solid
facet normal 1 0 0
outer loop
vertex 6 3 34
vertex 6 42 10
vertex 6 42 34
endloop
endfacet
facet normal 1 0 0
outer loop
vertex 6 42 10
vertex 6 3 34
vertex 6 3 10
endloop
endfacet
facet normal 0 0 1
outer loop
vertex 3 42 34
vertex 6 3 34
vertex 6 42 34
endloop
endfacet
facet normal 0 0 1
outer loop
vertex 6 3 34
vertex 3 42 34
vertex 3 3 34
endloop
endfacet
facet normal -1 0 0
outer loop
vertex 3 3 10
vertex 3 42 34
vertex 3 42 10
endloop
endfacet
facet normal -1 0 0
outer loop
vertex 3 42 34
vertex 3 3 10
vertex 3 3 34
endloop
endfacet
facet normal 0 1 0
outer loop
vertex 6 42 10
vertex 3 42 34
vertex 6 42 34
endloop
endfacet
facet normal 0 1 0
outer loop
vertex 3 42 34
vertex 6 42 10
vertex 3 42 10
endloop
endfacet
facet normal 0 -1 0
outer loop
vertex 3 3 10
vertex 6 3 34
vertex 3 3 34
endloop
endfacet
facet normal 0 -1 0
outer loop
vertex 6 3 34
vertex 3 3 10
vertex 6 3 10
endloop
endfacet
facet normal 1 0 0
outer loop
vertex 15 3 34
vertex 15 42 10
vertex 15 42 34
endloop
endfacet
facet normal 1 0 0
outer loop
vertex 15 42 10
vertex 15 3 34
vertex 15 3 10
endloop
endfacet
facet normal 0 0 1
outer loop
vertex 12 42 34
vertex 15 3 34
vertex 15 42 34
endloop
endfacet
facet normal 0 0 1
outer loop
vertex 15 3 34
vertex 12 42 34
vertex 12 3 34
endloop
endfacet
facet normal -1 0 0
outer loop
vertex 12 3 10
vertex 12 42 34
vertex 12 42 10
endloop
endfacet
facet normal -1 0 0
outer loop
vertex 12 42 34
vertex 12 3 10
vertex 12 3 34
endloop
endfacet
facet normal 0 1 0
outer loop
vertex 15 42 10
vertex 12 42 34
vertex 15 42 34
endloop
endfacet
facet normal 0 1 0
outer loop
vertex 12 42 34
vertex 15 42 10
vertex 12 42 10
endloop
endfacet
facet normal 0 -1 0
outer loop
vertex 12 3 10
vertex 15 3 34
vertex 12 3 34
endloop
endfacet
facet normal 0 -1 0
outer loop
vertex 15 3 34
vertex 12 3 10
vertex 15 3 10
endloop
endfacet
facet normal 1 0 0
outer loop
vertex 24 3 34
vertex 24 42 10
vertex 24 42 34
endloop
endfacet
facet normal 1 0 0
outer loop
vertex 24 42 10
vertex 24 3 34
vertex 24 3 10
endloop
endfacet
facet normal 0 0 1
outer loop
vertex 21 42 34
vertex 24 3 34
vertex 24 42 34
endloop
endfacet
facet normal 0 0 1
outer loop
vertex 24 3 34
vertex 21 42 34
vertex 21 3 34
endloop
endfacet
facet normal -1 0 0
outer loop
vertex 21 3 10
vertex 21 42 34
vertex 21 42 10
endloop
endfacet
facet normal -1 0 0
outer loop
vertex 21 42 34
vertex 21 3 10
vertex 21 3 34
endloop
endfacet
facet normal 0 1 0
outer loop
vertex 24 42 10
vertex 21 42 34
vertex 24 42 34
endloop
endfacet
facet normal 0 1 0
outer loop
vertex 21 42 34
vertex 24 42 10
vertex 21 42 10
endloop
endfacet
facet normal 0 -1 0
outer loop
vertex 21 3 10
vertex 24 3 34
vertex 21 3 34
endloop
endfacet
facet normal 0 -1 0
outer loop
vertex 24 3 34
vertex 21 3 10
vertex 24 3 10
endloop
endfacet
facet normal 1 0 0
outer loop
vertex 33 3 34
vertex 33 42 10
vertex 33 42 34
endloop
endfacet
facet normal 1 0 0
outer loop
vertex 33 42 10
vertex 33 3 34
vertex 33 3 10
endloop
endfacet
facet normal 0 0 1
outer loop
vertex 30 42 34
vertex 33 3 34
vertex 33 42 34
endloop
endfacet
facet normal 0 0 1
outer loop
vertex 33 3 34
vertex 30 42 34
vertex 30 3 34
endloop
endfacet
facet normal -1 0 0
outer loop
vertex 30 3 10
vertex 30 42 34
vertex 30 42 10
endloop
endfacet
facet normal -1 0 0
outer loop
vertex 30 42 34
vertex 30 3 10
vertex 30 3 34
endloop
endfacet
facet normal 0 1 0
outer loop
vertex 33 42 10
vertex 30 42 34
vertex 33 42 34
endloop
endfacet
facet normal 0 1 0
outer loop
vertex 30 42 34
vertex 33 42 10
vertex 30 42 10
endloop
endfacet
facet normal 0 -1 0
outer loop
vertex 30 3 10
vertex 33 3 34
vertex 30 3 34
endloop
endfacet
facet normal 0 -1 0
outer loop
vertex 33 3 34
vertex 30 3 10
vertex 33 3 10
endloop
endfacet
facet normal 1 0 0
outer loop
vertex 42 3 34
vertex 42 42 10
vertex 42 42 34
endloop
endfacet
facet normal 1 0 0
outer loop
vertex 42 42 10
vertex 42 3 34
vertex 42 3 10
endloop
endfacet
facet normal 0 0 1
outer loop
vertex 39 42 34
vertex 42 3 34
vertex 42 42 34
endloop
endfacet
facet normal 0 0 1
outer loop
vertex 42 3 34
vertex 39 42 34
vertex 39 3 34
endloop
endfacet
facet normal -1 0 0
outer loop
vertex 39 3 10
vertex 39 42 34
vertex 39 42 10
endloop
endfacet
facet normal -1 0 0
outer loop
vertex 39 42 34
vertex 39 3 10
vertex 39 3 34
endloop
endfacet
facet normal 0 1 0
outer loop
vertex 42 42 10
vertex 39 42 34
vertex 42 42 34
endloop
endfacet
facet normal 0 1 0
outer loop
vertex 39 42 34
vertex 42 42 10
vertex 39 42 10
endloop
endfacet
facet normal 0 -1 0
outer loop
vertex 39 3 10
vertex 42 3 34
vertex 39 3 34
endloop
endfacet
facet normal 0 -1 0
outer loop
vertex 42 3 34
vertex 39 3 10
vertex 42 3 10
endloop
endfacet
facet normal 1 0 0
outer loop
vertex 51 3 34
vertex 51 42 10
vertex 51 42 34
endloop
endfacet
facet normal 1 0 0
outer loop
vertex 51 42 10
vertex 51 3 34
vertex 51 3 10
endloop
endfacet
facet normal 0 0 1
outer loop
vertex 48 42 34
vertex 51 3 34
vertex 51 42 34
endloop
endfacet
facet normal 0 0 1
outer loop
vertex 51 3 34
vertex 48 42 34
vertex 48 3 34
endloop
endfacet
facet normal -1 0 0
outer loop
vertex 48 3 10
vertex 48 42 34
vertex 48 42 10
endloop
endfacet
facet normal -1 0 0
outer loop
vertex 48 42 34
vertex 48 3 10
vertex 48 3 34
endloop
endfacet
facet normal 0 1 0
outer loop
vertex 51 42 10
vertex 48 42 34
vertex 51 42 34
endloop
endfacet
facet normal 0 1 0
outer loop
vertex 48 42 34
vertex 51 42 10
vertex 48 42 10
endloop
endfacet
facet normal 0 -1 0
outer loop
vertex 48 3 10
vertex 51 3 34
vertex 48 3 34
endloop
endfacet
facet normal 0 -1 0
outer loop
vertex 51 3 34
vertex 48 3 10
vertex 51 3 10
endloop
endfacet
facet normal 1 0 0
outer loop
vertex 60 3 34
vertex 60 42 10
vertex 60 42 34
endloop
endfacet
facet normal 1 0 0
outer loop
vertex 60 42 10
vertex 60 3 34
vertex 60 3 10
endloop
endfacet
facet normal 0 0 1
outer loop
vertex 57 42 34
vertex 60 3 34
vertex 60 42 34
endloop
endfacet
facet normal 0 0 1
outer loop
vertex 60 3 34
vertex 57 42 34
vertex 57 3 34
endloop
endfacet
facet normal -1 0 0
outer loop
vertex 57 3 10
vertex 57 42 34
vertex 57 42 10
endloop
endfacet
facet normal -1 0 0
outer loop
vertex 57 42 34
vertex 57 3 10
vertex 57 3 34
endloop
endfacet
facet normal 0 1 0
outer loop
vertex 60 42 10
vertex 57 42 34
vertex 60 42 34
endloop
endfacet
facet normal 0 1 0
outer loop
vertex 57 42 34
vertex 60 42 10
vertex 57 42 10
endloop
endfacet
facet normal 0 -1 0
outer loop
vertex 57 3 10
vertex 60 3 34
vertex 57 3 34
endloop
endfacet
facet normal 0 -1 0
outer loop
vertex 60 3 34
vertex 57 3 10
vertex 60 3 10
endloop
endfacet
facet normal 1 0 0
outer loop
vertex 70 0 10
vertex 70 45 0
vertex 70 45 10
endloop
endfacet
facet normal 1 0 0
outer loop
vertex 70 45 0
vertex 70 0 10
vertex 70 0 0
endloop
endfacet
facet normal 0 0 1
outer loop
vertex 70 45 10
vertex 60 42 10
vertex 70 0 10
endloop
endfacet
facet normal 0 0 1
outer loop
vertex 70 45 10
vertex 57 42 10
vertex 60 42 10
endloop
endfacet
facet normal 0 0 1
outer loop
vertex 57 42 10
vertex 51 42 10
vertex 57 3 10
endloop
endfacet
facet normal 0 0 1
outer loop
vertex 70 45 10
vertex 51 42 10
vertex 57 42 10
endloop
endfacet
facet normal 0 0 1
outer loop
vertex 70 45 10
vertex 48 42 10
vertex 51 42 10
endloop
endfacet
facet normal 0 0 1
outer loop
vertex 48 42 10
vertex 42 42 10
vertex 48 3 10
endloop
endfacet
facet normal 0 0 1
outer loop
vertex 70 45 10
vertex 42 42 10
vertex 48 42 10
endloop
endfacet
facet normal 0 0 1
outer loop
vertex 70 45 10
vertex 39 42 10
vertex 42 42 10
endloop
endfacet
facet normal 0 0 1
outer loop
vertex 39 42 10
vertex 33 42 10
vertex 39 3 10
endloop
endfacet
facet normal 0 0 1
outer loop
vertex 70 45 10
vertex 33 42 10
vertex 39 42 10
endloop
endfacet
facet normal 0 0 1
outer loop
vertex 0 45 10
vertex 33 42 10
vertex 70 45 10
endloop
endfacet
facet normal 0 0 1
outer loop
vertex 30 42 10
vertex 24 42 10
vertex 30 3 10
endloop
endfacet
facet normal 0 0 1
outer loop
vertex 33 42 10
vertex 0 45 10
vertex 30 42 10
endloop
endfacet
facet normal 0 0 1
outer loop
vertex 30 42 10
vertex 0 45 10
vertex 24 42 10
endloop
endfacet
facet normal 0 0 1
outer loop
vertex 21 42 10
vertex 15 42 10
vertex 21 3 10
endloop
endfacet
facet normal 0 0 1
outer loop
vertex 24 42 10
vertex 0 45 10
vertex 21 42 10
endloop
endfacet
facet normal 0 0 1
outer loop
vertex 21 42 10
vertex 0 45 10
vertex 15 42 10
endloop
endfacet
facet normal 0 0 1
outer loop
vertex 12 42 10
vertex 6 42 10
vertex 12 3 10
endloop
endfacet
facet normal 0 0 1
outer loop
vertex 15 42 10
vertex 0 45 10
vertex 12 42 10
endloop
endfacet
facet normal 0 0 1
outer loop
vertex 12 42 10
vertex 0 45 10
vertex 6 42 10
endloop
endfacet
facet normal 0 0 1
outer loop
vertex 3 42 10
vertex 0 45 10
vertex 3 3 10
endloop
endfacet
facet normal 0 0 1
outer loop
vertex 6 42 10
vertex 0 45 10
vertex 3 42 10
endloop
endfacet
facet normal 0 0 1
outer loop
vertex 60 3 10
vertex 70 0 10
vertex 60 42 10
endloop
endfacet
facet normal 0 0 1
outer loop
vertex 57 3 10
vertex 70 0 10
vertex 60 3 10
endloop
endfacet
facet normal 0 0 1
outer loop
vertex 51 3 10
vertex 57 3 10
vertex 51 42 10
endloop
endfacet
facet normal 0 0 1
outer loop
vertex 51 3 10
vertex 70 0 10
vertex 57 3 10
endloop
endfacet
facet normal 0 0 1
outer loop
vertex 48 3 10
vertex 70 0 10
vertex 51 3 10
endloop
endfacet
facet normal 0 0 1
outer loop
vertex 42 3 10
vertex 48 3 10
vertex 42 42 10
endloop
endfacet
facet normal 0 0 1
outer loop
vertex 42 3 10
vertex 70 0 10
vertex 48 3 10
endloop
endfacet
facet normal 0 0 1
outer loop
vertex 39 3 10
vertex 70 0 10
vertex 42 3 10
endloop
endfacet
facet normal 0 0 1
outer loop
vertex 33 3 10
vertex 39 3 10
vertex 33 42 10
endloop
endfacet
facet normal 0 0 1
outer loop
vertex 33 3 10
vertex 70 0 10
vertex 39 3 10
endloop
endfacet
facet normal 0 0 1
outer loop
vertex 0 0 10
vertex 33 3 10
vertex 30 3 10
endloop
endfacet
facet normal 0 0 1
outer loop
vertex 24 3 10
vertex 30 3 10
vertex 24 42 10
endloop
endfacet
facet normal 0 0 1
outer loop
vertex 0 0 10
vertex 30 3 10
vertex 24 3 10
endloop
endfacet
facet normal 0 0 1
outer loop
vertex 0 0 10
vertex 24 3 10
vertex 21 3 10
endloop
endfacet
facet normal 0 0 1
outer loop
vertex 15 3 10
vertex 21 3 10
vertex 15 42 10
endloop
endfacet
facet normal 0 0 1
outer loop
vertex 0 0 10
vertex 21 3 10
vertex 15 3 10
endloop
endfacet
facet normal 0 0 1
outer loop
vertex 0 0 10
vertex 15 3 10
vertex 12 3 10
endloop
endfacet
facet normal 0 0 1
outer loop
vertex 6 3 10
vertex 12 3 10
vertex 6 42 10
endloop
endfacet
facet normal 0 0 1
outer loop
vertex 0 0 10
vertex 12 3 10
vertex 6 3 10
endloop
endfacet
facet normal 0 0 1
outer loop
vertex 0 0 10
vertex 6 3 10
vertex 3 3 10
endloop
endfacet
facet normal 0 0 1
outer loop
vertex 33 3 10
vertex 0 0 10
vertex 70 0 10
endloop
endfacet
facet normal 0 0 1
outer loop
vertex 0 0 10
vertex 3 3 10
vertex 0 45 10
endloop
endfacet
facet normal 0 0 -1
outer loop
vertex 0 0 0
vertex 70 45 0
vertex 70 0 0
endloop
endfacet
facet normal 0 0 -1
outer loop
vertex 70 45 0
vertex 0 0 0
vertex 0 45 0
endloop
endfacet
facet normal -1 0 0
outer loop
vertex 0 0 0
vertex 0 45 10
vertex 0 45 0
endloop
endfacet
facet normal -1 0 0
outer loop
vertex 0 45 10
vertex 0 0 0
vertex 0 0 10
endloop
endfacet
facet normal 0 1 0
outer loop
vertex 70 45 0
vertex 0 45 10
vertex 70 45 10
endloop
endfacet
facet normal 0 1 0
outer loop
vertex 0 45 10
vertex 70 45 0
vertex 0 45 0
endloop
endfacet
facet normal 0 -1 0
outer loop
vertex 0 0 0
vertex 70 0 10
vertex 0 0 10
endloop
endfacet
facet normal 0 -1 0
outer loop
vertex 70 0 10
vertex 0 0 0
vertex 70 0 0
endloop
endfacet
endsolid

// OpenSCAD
$fn = 32;

// ----------------------------------------------------------------------
// Heatsink: uniform fin block
// ----------------------------------------------------------------------

// --- parameters (mm) ---
base_l = 70;              // base length, X
base_w = 45;              // base width, Y
base_t = 10;              // base plate thickness
fin_h = 25;               // fin height above the base
fin_t = 3;                // fin thickness
edge = 3;                 // margin from the base ends
pitch = 9;                // fin pitch

n_fins = floor((base_l - 2 * edge - fin_t) / pitch) + 1;  // fin count
total_h = base_t + fin_h - 1;  // overall height

union() {
  cube([base_l, base_w, base_t]);
  for (i = [0 : n_fins - 1])
    translate([edge + i * pitch, edge, base_t - 1])
      cube([fin_t, base_w - 2 * edge, fin_h]);
}
